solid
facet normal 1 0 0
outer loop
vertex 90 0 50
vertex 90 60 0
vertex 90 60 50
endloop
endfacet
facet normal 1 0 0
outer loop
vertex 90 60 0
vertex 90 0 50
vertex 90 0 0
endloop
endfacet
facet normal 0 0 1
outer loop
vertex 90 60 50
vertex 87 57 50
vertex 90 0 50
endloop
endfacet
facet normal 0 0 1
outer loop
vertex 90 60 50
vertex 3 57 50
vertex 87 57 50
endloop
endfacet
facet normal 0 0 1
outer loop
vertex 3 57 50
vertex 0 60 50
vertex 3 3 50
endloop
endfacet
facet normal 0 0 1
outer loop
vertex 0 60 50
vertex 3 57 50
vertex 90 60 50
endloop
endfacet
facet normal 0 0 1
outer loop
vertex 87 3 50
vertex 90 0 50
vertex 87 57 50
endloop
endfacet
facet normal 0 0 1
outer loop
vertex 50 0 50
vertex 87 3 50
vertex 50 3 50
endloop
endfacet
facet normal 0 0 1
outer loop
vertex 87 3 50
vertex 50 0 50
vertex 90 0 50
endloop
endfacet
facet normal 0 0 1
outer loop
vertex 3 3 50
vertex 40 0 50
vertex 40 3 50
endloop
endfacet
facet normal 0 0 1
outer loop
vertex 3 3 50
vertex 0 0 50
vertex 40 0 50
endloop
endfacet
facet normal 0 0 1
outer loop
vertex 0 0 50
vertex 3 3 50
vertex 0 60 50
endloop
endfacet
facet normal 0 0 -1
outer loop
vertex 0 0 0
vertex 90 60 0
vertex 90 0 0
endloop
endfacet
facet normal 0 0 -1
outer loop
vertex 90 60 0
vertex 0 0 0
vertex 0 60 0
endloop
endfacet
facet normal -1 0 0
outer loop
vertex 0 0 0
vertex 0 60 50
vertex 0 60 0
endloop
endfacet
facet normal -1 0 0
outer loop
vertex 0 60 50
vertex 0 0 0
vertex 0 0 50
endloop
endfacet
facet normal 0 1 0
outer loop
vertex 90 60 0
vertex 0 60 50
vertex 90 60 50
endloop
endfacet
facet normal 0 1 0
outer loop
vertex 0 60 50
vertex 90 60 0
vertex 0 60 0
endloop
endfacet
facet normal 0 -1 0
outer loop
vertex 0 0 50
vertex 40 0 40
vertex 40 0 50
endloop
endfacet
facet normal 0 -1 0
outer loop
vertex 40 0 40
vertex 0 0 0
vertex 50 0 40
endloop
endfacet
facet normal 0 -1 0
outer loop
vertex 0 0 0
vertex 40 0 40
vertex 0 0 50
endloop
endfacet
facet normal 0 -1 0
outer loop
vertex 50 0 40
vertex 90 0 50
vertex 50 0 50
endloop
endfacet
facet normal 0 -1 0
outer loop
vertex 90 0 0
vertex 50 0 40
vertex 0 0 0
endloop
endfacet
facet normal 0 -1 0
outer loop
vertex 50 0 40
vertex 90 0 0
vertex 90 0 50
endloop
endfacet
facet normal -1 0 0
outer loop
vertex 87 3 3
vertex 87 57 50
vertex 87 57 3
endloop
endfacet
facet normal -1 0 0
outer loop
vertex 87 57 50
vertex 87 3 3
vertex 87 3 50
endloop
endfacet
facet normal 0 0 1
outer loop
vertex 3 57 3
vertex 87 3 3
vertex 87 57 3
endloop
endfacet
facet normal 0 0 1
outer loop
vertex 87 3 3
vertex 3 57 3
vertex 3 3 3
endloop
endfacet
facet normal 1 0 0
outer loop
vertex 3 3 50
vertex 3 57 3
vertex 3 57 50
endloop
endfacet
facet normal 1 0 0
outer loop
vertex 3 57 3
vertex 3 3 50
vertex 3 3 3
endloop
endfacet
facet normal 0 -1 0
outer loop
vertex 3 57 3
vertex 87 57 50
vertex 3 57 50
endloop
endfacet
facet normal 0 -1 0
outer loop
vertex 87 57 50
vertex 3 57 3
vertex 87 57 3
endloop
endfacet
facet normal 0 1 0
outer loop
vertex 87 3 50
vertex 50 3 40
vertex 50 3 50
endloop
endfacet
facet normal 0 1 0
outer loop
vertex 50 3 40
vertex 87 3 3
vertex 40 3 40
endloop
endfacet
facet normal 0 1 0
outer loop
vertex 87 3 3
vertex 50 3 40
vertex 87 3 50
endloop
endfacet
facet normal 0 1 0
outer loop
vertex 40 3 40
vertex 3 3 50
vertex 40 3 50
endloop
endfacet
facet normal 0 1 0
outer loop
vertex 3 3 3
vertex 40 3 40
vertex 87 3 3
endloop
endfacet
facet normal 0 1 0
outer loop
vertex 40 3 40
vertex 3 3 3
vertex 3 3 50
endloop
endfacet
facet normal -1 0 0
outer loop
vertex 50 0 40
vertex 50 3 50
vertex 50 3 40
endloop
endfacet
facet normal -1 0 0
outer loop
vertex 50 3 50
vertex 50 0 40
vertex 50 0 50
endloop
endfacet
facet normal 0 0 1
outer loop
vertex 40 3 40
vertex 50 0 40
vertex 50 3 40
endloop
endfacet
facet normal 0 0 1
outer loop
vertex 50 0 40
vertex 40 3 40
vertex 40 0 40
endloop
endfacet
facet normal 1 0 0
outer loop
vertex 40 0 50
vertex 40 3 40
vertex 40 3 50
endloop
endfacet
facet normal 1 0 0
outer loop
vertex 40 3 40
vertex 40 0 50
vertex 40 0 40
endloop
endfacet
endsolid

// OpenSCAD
$fn = 32;

// ----------------------------------------------------------------------
// Enclosure box: notch enclosure
// ----------------------------------------------------------------------

// --- parameters (mm) ---
box_l = 90;               // outer length, X
box_w = 60;               // outer width, Y
box_h = 50;               // outer height
wall_t = 3;               // wall thickness
notch_w = 10;             // cable notch width
notch_h = 10;             // cable notch height
fit_tol = 0.1;            // tolerance for press fits, mm
free_tol = 0.5;           // tolerance for clearance fits, mm

inner_h = box_h - wall_t;  // cavity depth
boss_h = inner_h - 2;  // corner boss height

difference() {
  union() {
    difference() {
      cube([box_l, box_w, box_h]);
      translate([wall_t, wall_t, wall_t])
        cube([box_l - 2 * wall_t, box_w - 2 * wall_t, box_h]);
    }
  }
  translate([box_l / 2 - notch_w / 2, -1, box_h - notch_h])
    cube([notch_w, wall_t + 2, notch_h + 1]);
}
